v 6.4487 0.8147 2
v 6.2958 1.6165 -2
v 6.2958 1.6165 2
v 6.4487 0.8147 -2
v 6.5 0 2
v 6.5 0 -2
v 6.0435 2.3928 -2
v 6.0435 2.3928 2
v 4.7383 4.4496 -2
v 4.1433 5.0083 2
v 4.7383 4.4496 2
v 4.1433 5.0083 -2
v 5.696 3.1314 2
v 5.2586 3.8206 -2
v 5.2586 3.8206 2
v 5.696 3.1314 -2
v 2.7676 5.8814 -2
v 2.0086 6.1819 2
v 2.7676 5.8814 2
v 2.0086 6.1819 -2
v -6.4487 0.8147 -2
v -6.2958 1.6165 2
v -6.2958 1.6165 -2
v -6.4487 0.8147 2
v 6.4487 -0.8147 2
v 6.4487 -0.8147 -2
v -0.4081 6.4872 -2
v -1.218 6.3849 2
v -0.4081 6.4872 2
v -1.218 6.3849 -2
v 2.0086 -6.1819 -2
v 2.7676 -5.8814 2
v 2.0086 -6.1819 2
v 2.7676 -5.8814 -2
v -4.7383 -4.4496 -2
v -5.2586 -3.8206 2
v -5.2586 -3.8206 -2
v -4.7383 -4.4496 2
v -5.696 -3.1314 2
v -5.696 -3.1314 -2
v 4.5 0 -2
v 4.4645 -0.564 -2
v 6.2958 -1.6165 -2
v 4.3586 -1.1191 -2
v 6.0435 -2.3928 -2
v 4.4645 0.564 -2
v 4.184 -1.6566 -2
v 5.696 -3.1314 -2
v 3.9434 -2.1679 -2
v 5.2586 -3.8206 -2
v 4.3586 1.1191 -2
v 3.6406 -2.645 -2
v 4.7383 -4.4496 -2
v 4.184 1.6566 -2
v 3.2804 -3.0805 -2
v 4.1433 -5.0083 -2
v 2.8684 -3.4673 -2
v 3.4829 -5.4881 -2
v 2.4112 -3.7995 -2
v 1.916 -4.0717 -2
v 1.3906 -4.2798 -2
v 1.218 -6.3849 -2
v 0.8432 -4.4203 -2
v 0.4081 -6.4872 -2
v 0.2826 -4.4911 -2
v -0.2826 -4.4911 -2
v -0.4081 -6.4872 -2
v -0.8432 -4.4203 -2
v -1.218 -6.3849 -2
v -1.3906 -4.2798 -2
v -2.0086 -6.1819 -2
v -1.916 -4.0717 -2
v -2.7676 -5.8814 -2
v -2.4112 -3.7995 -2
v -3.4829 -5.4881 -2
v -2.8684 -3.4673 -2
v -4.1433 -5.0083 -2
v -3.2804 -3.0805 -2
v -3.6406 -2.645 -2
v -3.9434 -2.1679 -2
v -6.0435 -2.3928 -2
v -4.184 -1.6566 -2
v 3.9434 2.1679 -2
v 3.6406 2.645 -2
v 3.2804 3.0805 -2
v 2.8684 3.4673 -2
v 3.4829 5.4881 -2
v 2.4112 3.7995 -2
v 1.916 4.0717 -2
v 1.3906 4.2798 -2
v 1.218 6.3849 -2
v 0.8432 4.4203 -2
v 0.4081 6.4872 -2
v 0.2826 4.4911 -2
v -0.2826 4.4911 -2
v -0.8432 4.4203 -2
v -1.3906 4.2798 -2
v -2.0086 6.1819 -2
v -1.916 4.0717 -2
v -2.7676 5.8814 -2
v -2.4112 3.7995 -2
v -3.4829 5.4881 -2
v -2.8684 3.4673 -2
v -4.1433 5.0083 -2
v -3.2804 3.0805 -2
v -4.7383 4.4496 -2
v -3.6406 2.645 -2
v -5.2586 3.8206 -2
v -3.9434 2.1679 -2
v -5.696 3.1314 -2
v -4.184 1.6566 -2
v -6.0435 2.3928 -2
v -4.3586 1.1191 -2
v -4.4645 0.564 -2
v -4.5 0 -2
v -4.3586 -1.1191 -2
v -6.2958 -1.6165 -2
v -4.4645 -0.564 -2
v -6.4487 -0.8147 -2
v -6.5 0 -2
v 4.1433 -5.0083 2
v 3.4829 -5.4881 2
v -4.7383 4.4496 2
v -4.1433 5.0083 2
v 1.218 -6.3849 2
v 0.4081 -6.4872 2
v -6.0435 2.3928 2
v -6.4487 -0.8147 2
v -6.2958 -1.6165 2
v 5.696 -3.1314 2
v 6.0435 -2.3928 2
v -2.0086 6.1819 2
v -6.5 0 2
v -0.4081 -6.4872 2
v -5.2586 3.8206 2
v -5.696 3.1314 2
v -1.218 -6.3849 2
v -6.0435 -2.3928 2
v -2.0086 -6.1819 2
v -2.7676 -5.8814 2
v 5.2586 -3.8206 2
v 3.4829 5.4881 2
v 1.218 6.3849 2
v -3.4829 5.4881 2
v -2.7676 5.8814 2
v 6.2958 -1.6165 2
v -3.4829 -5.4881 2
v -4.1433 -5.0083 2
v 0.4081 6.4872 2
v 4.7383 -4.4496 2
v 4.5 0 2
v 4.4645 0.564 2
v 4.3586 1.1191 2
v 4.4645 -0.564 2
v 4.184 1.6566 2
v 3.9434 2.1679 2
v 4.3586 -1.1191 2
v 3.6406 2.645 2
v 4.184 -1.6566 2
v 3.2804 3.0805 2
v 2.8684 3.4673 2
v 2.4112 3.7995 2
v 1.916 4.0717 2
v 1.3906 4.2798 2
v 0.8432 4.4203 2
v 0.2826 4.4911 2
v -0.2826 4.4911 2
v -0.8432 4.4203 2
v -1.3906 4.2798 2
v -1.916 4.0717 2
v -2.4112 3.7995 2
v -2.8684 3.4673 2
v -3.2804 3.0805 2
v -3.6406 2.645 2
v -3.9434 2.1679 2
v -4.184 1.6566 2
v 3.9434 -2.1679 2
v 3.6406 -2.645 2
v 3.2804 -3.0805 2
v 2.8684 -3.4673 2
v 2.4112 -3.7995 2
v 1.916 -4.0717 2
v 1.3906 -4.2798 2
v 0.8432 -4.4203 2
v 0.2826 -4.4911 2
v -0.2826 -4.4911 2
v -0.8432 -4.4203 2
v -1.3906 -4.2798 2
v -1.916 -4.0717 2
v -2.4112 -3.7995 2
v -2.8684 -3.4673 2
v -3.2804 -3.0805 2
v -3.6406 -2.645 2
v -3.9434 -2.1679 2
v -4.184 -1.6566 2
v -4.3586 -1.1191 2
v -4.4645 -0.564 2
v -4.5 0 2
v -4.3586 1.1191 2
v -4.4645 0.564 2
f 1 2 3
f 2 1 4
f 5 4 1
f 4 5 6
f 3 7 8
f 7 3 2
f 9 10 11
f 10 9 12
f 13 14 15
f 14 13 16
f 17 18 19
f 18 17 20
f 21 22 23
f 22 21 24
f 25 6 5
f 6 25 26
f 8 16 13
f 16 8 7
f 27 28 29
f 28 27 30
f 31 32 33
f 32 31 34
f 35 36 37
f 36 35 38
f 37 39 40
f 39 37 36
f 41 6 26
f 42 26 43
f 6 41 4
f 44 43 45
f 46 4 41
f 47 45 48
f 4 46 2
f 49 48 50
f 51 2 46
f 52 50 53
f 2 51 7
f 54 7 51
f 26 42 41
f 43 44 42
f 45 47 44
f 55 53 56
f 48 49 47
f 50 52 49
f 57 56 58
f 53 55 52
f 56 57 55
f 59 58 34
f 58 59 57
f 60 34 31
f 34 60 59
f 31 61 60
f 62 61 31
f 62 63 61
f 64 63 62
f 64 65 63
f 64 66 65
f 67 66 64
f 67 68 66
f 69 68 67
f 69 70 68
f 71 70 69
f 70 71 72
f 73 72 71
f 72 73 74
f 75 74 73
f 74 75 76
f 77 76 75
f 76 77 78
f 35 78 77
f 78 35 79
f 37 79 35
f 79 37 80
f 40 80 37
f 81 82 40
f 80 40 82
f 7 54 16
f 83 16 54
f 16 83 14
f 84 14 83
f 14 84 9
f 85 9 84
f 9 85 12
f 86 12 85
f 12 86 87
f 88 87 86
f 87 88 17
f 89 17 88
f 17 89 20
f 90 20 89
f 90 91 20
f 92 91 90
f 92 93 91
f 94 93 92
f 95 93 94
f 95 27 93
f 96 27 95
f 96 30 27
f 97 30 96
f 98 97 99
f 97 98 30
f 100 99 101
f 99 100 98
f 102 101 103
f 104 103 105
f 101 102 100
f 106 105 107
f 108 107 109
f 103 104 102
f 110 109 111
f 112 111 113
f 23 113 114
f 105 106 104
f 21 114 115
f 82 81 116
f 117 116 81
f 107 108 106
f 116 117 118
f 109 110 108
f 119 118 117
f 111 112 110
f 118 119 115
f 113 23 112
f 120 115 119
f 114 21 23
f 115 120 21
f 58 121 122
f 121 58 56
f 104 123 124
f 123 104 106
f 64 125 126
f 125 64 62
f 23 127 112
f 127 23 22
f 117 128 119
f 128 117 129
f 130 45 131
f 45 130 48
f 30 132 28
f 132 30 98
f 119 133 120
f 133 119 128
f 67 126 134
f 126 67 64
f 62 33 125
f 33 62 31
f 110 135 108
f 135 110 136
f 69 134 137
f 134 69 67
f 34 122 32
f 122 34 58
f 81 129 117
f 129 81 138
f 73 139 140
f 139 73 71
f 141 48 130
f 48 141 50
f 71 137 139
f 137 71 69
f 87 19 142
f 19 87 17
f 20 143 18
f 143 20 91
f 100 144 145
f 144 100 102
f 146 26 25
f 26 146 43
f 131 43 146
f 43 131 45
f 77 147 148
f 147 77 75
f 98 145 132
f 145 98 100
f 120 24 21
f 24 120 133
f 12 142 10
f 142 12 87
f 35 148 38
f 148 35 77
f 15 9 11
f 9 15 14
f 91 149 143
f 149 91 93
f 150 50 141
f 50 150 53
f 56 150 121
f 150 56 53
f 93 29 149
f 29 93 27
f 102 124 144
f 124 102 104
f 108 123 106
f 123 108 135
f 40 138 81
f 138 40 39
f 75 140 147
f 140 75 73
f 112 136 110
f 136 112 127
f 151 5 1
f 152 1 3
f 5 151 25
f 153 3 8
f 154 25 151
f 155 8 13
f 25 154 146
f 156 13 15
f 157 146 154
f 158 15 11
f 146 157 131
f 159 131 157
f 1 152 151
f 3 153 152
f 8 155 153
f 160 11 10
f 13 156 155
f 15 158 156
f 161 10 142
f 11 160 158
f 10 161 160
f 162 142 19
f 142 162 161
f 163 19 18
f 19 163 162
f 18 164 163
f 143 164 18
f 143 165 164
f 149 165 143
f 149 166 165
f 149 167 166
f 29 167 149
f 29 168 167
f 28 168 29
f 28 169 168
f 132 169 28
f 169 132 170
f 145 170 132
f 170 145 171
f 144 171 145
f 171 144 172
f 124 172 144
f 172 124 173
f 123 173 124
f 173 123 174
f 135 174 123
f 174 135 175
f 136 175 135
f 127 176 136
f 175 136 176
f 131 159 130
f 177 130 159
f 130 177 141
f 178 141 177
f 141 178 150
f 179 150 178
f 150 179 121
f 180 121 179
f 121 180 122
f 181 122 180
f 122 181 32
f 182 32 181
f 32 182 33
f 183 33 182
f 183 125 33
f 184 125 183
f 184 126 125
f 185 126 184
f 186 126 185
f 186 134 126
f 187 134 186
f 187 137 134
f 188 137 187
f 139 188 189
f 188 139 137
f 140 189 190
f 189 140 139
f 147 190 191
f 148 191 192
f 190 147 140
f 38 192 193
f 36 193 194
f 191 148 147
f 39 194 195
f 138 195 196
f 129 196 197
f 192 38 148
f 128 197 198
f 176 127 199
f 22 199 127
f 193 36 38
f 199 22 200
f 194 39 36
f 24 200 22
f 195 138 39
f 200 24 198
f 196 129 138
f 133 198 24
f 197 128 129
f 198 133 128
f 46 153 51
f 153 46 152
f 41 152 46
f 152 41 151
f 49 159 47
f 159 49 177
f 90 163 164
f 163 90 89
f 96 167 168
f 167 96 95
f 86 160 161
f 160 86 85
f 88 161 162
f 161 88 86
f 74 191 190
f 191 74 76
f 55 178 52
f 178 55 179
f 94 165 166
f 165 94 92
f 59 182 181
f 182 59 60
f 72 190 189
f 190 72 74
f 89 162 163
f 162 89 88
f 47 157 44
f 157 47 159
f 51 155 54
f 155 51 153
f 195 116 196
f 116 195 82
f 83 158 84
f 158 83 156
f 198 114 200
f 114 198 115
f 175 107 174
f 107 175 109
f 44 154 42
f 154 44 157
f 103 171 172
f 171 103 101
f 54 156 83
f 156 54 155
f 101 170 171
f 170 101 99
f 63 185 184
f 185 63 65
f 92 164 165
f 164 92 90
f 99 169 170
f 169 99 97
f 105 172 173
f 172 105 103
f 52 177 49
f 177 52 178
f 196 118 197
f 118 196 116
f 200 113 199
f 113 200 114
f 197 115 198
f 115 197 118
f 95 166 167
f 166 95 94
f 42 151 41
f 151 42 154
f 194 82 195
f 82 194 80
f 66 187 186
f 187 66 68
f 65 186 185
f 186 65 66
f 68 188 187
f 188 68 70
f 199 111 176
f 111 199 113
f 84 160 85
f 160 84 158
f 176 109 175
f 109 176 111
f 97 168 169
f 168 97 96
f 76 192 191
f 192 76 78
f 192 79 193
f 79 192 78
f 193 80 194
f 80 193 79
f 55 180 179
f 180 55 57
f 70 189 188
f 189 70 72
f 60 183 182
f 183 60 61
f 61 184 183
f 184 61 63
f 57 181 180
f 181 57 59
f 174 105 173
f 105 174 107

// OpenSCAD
$fn = 50;


difference() {
	union() {
		translate(v = [0, 0, -2.0000000000]) {
			cylinder(h = 4, r = 6.5000000000);
		}
	}
	union() {
		translate(v = [0, 0, -100.0000000000]) {
			cylinder(h = 200, r = 4.5000000000);
		}
	}
}
